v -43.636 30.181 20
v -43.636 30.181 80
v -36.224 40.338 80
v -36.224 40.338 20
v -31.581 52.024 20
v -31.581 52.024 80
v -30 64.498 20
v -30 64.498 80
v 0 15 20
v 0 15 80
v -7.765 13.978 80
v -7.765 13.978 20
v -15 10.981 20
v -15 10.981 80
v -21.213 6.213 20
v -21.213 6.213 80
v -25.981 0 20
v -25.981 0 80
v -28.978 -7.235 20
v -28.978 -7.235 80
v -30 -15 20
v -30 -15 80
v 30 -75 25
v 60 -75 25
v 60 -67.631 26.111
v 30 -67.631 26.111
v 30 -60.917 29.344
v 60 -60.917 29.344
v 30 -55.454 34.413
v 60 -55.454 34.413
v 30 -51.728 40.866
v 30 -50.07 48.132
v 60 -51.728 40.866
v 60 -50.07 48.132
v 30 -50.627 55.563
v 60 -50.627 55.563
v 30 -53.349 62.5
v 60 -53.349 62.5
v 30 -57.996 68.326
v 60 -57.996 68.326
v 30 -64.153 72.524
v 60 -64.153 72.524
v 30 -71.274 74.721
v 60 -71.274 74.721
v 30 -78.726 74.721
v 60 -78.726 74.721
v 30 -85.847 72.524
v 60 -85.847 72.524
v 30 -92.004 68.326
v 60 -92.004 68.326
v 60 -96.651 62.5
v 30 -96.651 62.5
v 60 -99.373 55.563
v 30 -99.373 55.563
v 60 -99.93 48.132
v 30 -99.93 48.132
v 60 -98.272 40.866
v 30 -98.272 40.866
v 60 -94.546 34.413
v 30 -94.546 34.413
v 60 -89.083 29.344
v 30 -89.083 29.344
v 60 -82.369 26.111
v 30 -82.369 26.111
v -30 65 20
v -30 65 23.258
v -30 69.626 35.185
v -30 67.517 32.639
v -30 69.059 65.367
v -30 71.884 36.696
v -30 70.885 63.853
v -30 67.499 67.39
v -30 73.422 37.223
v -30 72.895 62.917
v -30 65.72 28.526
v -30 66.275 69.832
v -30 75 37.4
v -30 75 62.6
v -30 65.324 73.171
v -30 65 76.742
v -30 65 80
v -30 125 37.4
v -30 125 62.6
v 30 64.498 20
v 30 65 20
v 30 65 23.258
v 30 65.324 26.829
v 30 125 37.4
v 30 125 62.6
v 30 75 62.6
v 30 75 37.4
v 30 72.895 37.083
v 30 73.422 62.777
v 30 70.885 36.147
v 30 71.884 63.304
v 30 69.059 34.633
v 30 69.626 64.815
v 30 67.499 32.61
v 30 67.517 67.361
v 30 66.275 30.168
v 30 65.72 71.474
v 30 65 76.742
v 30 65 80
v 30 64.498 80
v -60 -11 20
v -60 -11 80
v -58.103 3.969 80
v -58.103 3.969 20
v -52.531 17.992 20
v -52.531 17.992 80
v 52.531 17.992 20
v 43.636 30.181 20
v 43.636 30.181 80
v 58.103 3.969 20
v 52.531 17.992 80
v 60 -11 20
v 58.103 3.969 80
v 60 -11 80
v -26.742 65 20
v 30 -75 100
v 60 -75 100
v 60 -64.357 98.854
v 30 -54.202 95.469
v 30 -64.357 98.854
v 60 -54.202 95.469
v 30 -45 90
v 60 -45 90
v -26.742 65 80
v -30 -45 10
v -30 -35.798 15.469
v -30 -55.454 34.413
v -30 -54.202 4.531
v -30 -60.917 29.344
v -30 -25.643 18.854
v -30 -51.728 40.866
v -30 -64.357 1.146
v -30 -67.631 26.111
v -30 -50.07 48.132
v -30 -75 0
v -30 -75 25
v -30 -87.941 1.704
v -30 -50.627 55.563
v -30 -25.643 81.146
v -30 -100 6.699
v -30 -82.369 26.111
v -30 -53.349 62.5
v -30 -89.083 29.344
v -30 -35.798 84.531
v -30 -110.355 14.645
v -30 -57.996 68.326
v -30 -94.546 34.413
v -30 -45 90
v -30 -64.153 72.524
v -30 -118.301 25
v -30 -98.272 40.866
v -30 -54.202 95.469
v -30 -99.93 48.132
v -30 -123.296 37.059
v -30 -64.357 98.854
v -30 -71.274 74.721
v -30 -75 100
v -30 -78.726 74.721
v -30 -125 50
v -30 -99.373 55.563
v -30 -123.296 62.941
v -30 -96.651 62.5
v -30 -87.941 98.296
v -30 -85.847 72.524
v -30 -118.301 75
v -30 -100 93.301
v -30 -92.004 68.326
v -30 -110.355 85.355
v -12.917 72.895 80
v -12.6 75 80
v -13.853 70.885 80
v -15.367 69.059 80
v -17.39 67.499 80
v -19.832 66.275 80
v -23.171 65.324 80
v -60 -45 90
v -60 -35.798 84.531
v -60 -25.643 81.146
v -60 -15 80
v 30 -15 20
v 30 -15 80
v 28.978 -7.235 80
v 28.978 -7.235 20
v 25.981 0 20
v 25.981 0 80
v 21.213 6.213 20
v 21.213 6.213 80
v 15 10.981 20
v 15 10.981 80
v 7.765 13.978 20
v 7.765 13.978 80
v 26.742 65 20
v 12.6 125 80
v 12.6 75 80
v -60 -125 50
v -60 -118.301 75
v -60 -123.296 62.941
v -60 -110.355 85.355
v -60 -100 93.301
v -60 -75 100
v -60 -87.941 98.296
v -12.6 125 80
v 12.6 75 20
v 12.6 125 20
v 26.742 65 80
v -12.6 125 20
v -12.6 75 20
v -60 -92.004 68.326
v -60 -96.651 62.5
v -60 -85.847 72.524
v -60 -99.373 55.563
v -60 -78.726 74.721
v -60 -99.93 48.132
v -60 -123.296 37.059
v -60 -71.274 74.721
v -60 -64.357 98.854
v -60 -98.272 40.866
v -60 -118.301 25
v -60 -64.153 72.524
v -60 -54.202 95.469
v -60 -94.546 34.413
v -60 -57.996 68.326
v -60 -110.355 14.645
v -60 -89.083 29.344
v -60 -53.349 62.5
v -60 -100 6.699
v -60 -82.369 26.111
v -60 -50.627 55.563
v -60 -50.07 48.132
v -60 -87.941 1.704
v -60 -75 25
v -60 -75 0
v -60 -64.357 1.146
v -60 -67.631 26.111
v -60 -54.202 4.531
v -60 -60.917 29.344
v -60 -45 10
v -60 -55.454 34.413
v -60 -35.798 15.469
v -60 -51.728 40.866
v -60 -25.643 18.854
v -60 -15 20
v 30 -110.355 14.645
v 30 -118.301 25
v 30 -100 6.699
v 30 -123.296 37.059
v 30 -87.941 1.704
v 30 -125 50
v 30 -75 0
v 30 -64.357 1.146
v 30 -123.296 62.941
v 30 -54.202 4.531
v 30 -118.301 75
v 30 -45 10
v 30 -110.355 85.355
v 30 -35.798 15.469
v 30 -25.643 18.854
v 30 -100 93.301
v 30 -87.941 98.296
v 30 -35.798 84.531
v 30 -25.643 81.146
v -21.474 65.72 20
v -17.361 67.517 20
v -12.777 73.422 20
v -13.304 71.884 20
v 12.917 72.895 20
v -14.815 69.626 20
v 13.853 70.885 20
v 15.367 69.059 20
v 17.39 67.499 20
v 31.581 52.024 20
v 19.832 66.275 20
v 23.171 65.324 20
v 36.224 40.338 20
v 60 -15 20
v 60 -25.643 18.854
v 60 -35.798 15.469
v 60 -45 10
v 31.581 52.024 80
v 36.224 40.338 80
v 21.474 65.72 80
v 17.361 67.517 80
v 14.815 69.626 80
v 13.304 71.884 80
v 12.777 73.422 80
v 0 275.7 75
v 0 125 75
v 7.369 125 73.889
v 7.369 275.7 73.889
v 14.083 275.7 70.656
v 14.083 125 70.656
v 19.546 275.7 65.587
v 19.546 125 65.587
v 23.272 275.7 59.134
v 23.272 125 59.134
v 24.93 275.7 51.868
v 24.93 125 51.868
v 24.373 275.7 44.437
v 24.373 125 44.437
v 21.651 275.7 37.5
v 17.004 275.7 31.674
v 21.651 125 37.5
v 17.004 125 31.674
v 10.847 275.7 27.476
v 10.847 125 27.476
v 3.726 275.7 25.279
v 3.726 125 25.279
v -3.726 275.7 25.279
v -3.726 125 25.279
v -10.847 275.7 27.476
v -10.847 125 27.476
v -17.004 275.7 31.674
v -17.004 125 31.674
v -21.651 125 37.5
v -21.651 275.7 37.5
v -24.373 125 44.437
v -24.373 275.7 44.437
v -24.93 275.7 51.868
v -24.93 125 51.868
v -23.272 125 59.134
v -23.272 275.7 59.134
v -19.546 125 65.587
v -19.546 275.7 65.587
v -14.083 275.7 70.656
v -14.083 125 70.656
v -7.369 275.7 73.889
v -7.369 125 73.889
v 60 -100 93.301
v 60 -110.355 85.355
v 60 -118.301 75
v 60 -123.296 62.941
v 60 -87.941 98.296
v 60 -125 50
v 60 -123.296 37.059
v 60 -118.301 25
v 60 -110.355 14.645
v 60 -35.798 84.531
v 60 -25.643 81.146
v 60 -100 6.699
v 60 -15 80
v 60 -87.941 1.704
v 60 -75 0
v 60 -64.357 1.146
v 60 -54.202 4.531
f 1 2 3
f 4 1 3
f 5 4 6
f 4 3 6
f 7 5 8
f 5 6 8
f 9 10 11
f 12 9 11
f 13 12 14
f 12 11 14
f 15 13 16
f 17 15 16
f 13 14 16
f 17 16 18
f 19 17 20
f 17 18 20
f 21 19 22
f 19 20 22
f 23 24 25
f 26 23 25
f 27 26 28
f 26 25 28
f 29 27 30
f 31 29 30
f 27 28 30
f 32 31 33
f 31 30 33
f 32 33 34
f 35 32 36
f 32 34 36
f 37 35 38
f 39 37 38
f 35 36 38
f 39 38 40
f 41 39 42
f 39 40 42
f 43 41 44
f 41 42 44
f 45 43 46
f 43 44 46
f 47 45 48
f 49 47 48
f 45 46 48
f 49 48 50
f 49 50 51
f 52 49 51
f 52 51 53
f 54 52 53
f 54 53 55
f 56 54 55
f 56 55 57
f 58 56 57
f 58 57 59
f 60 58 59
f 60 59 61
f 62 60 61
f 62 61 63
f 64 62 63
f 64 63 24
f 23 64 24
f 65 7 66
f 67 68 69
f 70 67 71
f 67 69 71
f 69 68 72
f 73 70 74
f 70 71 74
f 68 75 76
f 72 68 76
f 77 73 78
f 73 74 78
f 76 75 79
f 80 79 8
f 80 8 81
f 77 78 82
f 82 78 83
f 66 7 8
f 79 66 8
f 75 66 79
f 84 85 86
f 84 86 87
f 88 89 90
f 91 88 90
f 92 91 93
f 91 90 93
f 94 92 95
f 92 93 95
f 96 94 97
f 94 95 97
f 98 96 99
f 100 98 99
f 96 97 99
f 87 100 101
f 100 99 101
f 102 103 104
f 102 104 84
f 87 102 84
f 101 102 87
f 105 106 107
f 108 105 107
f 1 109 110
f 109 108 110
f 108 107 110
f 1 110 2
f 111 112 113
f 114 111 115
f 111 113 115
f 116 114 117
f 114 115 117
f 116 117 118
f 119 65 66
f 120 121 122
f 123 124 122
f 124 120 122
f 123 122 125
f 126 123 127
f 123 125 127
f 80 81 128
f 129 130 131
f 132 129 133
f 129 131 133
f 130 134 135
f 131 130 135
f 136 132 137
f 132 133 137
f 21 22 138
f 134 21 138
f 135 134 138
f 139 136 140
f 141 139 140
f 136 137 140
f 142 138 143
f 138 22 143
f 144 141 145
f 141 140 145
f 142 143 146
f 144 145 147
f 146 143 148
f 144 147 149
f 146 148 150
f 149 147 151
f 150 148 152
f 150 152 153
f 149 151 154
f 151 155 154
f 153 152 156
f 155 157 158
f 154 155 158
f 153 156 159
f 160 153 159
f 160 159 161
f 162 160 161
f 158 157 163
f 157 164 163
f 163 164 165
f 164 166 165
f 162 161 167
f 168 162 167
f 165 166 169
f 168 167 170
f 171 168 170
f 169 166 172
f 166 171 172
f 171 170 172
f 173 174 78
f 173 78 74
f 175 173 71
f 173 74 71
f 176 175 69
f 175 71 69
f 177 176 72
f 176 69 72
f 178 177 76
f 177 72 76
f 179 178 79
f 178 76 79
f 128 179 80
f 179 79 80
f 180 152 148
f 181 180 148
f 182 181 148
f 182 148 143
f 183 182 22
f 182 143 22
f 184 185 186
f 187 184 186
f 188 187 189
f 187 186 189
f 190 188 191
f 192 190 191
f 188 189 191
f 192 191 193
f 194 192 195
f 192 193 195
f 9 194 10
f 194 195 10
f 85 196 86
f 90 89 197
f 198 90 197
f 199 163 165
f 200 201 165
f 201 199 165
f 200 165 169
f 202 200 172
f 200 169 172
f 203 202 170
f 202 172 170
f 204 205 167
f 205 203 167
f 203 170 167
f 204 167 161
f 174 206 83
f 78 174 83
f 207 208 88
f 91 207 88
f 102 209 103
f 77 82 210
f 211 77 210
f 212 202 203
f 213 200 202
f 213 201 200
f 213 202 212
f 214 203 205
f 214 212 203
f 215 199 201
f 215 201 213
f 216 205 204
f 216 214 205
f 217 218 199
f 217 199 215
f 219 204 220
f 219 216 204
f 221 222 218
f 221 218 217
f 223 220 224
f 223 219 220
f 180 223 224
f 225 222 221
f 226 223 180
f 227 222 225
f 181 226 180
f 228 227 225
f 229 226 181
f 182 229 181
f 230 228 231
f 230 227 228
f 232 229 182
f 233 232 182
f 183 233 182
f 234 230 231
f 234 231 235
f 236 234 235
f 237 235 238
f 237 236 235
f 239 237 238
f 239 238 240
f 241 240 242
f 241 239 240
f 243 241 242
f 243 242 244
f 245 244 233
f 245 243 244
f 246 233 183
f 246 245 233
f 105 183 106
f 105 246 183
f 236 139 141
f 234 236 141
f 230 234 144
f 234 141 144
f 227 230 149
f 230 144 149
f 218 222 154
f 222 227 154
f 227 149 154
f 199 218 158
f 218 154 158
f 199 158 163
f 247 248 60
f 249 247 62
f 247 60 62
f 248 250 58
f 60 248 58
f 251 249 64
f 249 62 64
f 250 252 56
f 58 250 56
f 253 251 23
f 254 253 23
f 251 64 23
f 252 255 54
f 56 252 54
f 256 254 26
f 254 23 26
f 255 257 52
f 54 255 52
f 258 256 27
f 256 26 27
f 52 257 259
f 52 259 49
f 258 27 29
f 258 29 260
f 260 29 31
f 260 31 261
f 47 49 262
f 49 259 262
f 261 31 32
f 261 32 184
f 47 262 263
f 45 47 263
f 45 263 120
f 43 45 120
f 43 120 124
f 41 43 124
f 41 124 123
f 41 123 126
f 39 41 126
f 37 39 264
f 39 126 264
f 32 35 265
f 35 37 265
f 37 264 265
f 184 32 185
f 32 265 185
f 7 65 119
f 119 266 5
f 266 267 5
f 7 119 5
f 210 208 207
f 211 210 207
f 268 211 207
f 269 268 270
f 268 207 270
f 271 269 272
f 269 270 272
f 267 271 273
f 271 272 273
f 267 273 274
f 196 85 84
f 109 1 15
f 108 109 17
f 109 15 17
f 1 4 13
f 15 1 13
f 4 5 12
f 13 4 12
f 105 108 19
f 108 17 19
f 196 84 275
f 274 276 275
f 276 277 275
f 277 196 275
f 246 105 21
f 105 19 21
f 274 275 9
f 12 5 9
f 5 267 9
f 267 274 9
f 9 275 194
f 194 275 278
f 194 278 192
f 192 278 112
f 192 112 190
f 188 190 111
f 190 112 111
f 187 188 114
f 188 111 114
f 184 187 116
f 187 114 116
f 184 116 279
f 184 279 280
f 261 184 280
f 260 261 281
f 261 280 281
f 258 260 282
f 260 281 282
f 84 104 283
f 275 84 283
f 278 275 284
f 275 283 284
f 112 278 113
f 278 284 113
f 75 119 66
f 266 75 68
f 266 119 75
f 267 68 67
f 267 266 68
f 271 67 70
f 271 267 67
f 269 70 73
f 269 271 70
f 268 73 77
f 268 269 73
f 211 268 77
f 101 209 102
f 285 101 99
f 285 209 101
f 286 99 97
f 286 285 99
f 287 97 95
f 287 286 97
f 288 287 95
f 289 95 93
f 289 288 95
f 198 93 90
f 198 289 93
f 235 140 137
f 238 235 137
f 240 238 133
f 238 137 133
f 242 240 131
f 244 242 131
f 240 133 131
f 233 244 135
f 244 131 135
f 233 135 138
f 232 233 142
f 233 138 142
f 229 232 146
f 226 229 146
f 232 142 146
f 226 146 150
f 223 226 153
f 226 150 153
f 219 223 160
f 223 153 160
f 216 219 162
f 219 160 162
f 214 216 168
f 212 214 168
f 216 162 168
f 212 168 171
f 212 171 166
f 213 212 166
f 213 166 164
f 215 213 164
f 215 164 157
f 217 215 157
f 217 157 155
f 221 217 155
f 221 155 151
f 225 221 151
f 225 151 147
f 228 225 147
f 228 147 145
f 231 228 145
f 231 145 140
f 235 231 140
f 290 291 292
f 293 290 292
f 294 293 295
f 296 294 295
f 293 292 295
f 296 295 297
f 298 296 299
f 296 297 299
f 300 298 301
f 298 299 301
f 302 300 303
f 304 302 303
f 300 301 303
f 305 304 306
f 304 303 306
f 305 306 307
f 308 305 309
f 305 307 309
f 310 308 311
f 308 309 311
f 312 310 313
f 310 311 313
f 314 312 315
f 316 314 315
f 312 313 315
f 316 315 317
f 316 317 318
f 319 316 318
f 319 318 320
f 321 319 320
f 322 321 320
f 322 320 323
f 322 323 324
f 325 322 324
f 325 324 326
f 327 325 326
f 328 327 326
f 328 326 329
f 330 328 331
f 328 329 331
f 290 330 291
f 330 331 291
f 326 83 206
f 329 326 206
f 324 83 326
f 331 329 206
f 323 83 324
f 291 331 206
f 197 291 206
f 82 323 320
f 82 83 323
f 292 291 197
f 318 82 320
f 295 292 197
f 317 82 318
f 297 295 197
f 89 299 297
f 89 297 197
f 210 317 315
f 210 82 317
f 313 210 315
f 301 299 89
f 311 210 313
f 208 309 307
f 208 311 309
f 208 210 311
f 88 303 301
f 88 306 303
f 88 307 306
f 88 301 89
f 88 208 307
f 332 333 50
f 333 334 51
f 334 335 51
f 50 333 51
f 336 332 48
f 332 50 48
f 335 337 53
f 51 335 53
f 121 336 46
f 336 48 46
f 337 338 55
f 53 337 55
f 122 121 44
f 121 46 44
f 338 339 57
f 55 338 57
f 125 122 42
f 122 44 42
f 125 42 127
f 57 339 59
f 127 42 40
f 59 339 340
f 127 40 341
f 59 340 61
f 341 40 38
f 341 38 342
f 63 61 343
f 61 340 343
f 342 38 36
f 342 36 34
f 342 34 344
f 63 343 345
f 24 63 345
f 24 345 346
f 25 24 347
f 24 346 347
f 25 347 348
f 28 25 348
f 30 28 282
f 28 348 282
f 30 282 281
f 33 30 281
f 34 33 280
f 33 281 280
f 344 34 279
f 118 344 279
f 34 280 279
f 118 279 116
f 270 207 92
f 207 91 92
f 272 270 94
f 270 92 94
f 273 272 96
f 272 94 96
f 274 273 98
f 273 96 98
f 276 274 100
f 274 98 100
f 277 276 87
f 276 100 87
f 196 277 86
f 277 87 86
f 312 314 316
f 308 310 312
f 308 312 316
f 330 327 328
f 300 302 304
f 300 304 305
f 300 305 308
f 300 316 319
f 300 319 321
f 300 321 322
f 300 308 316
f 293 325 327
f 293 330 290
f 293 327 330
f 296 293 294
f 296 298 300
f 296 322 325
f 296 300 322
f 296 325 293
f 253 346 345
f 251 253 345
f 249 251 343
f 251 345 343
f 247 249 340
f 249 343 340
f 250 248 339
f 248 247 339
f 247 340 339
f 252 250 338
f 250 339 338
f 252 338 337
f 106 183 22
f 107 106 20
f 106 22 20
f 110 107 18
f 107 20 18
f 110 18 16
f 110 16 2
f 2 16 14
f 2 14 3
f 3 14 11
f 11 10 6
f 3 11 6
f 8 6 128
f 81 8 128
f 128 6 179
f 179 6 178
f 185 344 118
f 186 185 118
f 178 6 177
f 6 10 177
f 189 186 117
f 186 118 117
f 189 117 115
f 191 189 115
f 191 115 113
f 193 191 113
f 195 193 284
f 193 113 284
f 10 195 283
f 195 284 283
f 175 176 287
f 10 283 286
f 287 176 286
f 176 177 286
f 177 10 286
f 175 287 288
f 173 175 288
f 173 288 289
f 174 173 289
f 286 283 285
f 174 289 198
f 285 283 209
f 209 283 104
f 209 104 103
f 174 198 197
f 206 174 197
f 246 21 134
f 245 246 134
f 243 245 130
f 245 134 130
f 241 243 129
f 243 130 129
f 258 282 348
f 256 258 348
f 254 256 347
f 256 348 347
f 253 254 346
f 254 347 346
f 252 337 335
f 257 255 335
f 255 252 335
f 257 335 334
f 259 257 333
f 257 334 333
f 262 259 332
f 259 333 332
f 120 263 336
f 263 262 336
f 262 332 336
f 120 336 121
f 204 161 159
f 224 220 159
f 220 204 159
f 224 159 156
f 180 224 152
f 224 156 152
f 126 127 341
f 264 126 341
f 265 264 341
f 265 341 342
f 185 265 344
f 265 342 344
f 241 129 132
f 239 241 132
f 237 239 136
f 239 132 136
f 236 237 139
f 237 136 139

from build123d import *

# Parameters (mm, degrees)
SKETCH1_W           = 120
SKETCH1_H           = 250
BOSS_EXTRUDE1_DEPTH = 100
CUT_EXTRUDE1_DEPTH  = 100
CUT_EXTRUDE2_DEPTH  = 240
SKETCH4_4_R         = 25
CUT_EXTRUDE3_DEPTH  = 240
CUT_EXTRUDE4_DEPTH  = 60
SKETCH5_3_R         = 25
BOSS_EXTRUDE2_DEPTH = 150.7
FILLET1_R           = 10


with BuildPart() as part:
    # Sketch1 → Boss-Extrude1 (new body)
    with BuildSketch(Plane.XY):
        Rectangle(SKETCH1_W, SKETCH1_H)
    extrude(amount=BOSS_EXTRUDE1_DEPTH)

    # Sketch2 → Cut-Extrude1 (cut)
    with BuildSketch(Plane.XY.offset(100)):
        with BuildLine():
            ThreePointArc((30, -15), (21.213203436, 6.213203436), (0, 15))
            ThreePointArc((0, 15), (-21.213203436, 6.213203436), (-30, -15))
            Line((-30, -15), (-30, -125))
            Line((-30, -125), (30, -125))
            Line((30, -125), (30, -15))
        make_face()
        with BuildLine():
            Line((60, 125), (30, 125))
            Line((30, 125), (30, 64.498344353))
            ThreePointArc((30, 64.498344353), (33.533981136, 46.034620706), (43.636363636, 30.180915101))
            ThreePointArc((43.636363636, 30.180915101), (55.759222645, 11.156468358), (60, -11.00000004))
            Line((60, -11.00000004), (60, 125))
        make_face()
        with BuildLine():
            Line((-30, 64.498344353), (-30, 125))
            Line((-30, 125), (-60, 125))
            Line((-60, 125), (-60, -11))
            ThreePointArc((-60, -11), (-55.759222637, 11.156468376), (-43.636363636, 30.180915101))
            ThreePointArc((-43.636363636, 30.180915101), (-33.533981136, 46.034620706), (-30, 64.498344353))
        make_face()
    extrude(amount=-CUT_EXTRUDE1_DEPTH, mode=Mode.SUBTRACT)

    # Sketch4 → Cut-Extrude2 (cut)
    with BuildSketch(Plane(origin=(70, 0, 0), x_dir=(0, 0, -1), z_dir=(1, 0, 0))):
        with BuildLine():
            Line((-100, -75), (-100, -125))
            Line((-100, -125), (-50, -125))
            ThreePointArc((-50, -125), (-85.355339059, -110.355339059), (-100, -75))
        make_face()
        with BuildLine():
            Line((-100, 125), (-100, -75))
            ThreePointArc((-100, -75), (-97.434164903, -59.188611699), (-90, -45))
            ThreePointArc((-90, -45), (-82.565835097, -30.811388301), (-80, -15))
            Line((-80, -15), (-80, 125))
            Line((-80, 125), (-100, 125))
        make_face()
        with BuildLine():
            ThreePointArc((0, -75.000000253), (-14.64466103, -110.355339149), (-50, -125))
            Line((-50, -125), (0, -125))
            Line((0, -125), (0, -75.000000253))
        make_face()
        with BuildLine():
            ThreePointArc((-10, -45), (-2.565835058, -59.188611819), (0, -75.000000253))
            Line((0, -75.000000253), (0, 125))
            Line((0, 125), (-20, 125))
            Line((-20, 125), (-20, -15))
            ThreePointArc((-20, -15), (-17.434164903, -30.811388301), (-10, -45))
        make_face()
    extrude(amount=-CUT_EXTRUDE2_DEPTH, mode=Mode.SUBTRACT)

    # Sketch4<4> → Cut-Extrude3 (cut)
    with BuildSketch(Plane(origin=(70, 0, 0), x_dir=(0, 0, -1), z_dir=(1, 0, 0))):
        with Locations((-50, -75)):
            Circle(SKETCH4_4_R)
    extrude(amount=-CUT_EXTRUDE3_DEPTH, mode=Mode.SUBTRACT)

    # Sketch5 → Cut-Extrude4 (cut)
    with BuildSketch(Plane(origin=(0, 125, 0), x_dir=(1, 0, 0), z_dir=(0, 1, 0))):
        Polygon((-30, -62.6), (-30, -80), (-12.6, -80), align=None)
        Polygon((-30, -20), (-30, -37.4), (-12.6, -20), align=None)
        Polygon((30, -62.6), (12.6, -80), (30, -80), align=None)
        Polygon((12.6, -20), (30, -37.4), (30, -20), align=None)
    extrude(amount=-CUT_EXTRUDE4_DEPTH, mode=Mode.SUBTRACT)

    # Sketch5<3> → Boss-Extrude2 (add)
    with BuildSketch(Plane(origin=(0, 125, 0), x_dir=(1, 0, 0), z_dir=(0, 1, 0))):
        with Locations((0, -50)):
            Circle(SKETCH5_3_R)
    extrude(amount=BOSS_EXTRUDE2_DEPTH)

    # Fillet1
    fillet1_edges = [part.edges().sort_by_distance(p)[0] for p in [
        (-21.3, 65, 71.3),
        (-21.3, 65, 28.7),
        (21.3, 65, 28.7),
        (21.3, 65, 71.3),
    ]]
    fillet(fillet1_edges, radius=FILLET1_R)


solid = part.part
